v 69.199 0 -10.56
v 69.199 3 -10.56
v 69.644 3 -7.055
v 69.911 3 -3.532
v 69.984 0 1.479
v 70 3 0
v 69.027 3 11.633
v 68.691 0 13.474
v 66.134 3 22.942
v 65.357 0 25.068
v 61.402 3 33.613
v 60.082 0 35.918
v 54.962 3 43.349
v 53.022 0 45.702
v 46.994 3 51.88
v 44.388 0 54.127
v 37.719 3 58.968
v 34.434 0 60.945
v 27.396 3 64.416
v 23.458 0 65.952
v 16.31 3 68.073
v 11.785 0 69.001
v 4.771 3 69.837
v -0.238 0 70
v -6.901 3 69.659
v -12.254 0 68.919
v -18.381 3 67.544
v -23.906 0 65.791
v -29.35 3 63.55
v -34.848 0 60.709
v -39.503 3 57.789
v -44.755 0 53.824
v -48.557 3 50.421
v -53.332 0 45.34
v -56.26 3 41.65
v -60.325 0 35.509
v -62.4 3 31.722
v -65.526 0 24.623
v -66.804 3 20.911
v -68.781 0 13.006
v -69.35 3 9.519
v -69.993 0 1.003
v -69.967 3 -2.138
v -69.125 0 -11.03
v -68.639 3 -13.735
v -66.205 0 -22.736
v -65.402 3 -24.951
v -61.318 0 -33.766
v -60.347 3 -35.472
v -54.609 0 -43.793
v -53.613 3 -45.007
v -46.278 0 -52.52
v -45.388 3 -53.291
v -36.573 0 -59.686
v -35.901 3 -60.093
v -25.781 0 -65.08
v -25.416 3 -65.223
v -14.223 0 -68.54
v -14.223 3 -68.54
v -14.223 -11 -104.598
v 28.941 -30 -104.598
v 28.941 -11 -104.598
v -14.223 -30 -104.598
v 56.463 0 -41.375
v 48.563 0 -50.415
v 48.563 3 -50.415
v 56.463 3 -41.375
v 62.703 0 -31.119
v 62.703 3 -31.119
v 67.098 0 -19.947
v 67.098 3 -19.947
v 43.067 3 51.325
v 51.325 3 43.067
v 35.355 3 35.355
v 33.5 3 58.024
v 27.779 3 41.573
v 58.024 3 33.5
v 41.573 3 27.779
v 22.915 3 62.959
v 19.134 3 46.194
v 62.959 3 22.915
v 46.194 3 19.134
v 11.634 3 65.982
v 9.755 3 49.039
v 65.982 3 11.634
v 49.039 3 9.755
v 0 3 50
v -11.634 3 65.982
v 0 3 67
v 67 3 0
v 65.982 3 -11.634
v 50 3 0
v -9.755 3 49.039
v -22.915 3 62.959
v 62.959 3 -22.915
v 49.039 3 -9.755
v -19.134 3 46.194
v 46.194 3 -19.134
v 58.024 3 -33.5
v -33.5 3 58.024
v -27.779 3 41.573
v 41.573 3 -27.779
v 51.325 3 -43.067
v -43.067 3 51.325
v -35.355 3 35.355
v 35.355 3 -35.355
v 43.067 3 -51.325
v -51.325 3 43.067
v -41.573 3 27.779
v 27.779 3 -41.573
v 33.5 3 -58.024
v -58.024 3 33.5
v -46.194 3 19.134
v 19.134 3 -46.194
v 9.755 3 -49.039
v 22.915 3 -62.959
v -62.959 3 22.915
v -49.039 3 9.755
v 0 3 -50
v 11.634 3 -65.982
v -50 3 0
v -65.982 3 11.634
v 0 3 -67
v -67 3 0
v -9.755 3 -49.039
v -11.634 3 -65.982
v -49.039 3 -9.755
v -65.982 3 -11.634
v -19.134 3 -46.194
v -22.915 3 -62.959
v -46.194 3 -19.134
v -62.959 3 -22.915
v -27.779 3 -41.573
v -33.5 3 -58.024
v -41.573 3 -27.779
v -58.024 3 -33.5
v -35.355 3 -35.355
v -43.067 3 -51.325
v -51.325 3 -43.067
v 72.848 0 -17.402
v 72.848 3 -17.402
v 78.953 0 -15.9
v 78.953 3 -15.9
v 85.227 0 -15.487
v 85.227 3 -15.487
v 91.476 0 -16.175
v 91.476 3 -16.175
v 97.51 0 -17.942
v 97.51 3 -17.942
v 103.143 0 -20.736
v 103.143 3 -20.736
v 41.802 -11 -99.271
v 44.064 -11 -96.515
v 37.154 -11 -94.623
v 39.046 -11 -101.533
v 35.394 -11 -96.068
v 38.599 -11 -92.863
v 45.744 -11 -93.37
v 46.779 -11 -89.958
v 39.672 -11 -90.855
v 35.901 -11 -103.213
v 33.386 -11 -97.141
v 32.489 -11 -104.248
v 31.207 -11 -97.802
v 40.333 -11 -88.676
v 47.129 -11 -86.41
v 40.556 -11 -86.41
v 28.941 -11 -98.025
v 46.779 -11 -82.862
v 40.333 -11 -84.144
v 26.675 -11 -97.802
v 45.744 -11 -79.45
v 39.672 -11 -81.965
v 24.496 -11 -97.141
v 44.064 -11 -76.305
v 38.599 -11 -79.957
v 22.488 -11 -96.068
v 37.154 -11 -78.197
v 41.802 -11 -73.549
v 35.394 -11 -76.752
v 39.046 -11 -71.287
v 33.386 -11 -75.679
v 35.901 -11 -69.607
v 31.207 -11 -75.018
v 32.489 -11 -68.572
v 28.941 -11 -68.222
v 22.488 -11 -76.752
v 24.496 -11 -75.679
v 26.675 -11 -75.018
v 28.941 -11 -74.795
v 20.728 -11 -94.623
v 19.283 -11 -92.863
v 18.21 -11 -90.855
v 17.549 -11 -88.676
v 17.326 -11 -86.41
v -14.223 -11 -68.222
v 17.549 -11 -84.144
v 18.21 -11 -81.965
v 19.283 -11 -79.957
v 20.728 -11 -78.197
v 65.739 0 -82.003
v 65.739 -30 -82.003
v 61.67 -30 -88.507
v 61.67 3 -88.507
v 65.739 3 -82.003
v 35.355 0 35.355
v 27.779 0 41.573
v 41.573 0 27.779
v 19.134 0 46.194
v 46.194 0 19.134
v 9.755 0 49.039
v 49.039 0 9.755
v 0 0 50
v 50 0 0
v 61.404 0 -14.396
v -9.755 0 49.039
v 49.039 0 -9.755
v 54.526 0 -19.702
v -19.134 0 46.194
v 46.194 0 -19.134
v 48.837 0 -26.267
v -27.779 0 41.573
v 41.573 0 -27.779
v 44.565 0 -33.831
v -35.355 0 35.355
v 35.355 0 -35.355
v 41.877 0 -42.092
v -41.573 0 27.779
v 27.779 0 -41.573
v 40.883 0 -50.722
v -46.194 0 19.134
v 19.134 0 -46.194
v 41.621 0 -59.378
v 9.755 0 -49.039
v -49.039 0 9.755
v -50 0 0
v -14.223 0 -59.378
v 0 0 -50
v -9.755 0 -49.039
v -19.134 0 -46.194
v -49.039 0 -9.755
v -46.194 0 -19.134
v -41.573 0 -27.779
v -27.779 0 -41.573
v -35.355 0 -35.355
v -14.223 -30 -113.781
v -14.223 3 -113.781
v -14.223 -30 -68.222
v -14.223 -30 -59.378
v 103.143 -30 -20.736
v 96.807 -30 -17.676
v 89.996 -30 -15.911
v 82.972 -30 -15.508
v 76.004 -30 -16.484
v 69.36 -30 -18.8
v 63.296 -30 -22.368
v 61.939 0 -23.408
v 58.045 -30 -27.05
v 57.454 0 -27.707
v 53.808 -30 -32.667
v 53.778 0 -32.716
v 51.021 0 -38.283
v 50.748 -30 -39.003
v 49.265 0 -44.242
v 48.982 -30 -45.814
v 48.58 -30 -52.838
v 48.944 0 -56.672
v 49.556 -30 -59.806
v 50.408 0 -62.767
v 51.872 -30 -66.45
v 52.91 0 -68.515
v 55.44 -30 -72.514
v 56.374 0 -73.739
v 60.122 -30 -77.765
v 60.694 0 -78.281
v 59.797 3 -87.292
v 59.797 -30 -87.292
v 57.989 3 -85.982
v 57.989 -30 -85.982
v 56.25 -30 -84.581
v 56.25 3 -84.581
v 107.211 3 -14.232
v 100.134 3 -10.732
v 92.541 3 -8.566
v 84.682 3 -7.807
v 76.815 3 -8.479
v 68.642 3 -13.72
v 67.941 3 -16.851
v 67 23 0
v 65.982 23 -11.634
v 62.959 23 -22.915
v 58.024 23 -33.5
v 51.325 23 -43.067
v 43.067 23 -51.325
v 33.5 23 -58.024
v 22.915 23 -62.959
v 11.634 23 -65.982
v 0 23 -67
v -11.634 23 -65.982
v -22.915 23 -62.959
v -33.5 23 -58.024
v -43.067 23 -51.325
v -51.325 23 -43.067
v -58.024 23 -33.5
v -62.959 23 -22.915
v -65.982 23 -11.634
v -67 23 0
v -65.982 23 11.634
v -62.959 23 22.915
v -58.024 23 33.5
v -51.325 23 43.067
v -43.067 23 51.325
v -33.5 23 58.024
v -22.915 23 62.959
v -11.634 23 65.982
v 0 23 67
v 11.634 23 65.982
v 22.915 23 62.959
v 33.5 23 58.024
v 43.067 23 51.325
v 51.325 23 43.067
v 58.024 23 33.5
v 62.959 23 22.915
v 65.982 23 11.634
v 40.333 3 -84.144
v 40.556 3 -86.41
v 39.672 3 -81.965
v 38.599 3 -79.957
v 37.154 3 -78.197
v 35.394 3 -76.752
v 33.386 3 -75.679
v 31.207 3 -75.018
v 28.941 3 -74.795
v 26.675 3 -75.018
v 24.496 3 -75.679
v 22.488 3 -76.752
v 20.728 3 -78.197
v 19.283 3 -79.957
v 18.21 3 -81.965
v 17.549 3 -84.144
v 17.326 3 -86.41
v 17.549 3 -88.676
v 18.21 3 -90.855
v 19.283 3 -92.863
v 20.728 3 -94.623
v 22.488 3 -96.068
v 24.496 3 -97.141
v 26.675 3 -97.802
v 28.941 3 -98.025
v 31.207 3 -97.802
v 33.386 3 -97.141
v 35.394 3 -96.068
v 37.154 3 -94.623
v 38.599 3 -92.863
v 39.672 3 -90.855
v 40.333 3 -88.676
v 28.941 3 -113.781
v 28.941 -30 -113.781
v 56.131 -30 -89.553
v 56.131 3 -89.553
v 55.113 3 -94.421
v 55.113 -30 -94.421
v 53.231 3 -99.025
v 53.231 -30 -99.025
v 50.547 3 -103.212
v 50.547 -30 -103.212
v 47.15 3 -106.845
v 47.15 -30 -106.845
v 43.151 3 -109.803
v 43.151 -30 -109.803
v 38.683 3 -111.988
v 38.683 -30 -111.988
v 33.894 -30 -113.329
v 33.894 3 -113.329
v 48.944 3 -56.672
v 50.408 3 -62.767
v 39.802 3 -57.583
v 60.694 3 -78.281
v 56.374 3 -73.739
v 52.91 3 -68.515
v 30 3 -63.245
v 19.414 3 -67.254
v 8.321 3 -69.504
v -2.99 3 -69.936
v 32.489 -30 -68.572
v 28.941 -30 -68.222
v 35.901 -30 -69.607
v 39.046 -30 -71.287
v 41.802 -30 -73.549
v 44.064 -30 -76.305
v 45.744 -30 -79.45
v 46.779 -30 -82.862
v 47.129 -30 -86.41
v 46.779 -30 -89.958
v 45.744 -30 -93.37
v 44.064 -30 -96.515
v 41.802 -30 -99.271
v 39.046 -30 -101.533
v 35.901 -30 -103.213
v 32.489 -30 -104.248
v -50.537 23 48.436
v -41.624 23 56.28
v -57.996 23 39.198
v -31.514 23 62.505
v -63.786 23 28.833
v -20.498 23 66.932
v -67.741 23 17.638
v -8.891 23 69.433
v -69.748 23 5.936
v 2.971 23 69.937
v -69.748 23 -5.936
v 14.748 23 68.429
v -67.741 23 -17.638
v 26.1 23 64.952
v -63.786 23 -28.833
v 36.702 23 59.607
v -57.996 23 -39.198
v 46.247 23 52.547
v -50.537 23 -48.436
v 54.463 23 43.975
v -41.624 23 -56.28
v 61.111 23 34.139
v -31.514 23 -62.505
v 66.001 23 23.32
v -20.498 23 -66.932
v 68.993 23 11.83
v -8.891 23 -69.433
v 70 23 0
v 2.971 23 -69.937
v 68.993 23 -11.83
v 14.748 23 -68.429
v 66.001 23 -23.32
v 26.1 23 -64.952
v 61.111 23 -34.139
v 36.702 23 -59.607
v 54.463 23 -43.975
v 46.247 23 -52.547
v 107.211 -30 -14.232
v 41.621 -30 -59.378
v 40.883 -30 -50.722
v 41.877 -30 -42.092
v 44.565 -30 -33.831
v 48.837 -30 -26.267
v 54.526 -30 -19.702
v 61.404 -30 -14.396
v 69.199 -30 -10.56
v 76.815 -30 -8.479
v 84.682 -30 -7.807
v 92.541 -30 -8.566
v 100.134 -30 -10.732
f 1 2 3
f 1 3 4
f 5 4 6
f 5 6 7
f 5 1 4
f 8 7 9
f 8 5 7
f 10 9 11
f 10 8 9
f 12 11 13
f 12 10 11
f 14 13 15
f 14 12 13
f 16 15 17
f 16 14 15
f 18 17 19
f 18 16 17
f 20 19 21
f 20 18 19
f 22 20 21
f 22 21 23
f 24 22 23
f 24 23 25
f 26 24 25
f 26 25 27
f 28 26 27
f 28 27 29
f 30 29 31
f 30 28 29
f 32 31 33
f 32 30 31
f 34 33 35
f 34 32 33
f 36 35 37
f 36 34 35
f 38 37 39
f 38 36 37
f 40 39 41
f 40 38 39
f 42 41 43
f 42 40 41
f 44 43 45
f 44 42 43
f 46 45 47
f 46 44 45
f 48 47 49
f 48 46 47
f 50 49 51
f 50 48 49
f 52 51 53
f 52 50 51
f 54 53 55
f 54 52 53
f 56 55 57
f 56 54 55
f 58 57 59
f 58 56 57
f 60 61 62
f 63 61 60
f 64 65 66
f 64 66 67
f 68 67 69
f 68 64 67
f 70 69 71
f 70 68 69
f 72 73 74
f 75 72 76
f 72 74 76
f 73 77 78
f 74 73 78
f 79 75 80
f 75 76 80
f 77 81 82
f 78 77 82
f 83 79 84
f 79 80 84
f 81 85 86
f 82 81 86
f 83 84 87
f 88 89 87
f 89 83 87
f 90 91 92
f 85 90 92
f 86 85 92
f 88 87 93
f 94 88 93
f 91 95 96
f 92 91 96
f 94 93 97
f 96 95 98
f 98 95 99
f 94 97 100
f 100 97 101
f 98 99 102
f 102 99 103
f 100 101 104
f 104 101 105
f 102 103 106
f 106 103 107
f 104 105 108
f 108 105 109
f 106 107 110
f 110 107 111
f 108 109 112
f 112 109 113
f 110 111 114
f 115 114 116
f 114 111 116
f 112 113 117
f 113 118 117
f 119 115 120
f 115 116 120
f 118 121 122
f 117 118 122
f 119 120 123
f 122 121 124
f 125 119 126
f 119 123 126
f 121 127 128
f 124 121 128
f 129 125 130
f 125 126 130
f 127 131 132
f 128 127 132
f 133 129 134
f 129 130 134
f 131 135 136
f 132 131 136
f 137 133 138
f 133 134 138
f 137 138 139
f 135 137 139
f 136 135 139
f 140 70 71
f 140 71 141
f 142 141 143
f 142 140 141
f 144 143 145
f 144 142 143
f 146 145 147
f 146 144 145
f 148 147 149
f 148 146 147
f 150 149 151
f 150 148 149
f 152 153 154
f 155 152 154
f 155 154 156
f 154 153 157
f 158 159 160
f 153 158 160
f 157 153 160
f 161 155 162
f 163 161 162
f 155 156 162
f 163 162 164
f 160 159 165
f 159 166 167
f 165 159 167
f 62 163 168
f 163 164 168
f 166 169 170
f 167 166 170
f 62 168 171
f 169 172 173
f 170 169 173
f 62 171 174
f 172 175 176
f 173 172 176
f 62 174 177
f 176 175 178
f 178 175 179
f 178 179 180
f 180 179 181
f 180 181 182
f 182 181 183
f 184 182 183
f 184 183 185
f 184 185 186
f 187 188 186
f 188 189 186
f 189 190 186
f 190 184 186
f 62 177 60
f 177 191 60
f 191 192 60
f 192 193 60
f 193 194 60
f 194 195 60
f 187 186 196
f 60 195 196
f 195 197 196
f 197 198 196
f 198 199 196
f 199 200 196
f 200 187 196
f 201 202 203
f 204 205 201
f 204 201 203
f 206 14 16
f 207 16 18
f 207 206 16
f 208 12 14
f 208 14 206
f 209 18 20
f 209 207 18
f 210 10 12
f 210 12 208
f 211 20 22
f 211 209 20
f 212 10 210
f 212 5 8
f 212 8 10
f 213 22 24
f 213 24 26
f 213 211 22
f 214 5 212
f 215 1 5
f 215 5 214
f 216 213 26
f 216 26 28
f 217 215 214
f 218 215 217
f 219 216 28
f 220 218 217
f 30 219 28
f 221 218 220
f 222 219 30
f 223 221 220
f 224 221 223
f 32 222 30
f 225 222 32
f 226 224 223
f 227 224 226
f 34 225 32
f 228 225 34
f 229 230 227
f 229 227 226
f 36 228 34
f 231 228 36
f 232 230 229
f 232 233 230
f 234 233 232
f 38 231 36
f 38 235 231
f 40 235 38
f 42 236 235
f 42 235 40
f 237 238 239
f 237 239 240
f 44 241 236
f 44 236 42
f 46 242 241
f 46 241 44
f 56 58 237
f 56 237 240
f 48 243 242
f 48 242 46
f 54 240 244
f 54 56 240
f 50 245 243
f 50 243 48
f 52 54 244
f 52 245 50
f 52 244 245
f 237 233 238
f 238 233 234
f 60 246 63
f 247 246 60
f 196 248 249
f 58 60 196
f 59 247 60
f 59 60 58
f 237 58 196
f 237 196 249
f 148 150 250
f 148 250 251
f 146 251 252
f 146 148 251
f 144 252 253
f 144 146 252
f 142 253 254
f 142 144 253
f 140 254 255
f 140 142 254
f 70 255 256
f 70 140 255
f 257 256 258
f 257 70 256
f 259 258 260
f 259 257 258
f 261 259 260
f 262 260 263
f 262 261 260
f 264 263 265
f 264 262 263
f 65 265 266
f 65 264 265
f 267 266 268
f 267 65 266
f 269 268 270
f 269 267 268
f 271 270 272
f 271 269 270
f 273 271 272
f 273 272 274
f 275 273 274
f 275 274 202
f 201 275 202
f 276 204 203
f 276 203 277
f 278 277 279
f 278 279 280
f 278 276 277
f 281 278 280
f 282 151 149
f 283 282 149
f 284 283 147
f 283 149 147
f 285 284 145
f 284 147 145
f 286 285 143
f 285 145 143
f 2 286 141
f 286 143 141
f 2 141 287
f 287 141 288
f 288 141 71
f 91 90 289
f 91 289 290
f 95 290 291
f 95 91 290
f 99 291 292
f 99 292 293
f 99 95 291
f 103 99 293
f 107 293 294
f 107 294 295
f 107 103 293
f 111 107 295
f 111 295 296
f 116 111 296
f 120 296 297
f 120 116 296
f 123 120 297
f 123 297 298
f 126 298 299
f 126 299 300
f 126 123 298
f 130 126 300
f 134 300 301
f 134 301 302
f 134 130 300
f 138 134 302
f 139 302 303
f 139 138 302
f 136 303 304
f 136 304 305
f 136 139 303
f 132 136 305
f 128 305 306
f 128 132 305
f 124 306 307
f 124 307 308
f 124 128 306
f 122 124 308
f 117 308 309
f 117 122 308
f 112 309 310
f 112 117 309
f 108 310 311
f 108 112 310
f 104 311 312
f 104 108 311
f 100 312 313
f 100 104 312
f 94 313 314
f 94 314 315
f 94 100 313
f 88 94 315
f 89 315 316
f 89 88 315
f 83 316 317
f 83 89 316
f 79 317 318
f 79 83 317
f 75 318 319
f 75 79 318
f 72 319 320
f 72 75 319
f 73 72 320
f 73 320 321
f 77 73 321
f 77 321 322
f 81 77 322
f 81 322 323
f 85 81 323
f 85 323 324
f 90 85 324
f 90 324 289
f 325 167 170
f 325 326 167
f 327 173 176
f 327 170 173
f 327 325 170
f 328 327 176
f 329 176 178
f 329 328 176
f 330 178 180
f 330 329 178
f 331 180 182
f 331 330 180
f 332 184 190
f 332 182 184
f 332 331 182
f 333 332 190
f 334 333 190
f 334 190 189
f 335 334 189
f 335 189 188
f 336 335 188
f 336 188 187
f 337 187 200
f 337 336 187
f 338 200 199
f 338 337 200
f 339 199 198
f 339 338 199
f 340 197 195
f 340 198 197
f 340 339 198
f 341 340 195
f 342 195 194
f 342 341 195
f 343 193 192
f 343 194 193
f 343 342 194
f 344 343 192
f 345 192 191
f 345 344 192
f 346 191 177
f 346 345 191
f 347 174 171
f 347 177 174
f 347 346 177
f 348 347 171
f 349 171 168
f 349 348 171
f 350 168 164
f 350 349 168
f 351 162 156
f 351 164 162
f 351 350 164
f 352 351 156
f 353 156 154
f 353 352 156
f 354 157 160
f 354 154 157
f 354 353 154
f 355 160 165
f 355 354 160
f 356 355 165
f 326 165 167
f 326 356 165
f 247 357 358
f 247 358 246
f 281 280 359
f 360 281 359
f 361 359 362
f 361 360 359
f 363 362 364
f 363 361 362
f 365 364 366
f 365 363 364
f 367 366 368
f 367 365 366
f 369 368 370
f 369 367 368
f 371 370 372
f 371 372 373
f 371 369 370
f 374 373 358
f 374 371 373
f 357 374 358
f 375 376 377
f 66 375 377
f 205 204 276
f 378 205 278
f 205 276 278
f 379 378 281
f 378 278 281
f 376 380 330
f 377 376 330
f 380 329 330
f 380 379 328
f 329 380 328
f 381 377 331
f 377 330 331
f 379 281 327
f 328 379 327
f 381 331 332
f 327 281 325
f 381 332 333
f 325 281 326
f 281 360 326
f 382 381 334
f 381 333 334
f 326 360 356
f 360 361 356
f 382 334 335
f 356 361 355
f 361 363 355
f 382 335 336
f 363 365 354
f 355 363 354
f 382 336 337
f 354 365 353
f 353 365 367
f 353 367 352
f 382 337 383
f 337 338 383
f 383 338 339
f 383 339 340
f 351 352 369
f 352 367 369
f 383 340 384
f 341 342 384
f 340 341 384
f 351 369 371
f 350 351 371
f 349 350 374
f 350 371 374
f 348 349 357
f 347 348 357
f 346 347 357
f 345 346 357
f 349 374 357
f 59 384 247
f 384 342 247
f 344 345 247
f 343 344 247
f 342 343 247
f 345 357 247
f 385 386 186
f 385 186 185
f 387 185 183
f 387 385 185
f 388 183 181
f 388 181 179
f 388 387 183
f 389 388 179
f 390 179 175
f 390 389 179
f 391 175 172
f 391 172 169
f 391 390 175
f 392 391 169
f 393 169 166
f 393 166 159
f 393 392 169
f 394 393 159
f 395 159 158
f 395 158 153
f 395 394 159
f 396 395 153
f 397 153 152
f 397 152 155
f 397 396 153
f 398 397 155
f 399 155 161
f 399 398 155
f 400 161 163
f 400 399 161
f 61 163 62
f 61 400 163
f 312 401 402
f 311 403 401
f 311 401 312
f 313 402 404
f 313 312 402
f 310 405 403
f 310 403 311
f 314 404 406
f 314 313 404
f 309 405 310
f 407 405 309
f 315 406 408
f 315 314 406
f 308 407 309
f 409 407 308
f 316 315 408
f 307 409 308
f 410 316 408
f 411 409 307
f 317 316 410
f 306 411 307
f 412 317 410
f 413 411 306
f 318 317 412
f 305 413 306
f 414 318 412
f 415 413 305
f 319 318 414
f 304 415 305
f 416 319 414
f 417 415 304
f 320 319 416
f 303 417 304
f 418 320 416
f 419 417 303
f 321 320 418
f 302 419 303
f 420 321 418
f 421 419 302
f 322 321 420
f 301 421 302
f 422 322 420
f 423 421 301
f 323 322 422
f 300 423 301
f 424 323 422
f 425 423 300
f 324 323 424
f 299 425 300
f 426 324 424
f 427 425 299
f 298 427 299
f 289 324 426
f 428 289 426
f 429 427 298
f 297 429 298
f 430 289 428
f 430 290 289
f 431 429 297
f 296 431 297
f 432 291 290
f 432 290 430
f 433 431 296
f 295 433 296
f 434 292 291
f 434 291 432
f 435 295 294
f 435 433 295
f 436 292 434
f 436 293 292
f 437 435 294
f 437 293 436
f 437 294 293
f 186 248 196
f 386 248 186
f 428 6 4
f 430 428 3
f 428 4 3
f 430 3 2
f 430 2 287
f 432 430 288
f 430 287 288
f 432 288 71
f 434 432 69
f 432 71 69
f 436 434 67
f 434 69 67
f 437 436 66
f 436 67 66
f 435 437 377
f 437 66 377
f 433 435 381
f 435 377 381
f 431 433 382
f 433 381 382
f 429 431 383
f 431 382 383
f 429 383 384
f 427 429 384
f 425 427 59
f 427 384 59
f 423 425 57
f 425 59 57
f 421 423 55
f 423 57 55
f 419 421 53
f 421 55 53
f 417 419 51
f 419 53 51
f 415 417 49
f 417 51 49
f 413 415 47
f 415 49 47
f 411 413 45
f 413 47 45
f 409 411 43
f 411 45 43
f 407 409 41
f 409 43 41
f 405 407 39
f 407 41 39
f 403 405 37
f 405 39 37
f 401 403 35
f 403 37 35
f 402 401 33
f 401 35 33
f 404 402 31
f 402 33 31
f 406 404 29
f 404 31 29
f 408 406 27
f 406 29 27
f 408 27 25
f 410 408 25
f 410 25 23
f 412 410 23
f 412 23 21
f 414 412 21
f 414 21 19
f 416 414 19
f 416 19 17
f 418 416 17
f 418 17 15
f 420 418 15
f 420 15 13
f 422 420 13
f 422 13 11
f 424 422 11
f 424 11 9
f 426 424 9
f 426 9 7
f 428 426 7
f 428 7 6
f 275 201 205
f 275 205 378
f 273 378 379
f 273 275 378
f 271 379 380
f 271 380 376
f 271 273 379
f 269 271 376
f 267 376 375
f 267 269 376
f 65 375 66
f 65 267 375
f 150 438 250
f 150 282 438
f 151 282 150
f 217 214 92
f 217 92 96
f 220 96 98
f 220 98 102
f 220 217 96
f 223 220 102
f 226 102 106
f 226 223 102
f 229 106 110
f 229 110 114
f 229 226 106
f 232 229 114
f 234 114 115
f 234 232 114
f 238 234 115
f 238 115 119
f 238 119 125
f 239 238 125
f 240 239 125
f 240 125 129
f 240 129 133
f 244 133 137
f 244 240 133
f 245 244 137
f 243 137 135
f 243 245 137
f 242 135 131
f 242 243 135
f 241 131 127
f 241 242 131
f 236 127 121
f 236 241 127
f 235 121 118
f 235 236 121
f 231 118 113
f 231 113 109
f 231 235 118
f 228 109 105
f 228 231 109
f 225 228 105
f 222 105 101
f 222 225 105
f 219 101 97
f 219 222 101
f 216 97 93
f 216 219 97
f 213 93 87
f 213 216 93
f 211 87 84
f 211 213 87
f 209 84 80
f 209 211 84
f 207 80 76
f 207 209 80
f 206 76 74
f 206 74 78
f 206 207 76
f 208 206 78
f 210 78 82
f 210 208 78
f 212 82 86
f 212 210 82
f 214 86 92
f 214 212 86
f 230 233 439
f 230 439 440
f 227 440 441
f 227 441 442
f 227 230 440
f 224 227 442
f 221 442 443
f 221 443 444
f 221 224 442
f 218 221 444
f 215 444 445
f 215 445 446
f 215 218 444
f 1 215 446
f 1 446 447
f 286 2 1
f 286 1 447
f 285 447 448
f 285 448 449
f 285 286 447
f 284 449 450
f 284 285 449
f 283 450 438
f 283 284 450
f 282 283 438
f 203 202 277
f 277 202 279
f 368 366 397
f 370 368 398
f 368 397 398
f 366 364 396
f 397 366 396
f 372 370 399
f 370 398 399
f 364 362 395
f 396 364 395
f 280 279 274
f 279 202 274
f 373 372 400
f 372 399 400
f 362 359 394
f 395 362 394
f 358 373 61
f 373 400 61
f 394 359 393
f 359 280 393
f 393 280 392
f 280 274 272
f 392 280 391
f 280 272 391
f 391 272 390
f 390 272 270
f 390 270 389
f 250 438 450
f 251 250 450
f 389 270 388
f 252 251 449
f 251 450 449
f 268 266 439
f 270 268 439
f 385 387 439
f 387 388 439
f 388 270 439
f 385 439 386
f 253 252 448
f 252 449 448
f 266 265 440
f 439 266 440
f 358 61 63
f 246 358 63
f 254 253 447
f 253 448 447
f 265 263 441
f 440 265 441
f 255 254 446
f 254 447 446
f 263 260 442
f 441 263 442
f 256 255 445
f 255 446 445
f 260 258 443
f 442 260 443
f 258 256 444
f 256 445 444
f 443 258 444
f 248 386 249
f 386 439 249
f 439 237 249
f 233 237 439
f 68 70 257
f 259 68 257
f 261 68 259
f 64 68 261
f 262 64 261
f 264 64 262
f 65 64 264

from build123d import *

# Parameters (mm, degrees)
SKETCH1_R           = 50
SKETCH1_R_2         = 11.615083761
BOSS_EXTRUDE1_DEPTH = 3
SKETCH2_R           = 70
SKETCH2_R_2         = 67
BOSS_EXTRUDE3_DEPTH = 20
SKETCH4_R           = 11.615083761
BOSS_EXTRUDE6_DEPTH = 30
CUT_EXTRUDE2_DEPTH  = 19


with BuildPart() as part:
    # Sketch1 → Boss-Extrude1 (new body)
    with BuildSketch(Plane(origin=(0, 0, 0), x_dir=(1, 0, 0), z_dir=(0, 1, 0))):
        with BuildLine():
            Line((61.670303131, 88.507050428), (65.738918694, 82.002662996))
            ThreePointArc((65.738918694, 82.002662996), (52.910005118, 68.514839013), (48.562558373, 50.415056524))
            ThreePointArc((48.562558373, 50.415056524), (59.803165171, 36.381058747), (67.097930635, 19.94662138))
            ThreePointArc((67.097930635, 19.94662138), (85.226692334, 15.486926368), (103.142834496, 20.735995847))
            Line((103.142834496, 20.735995847), (107.211450059, 14.231608415))
            ThreePointArc((107.211450059, 14.231608415), (88.628926733, 8.008407228), (69.198869979, 10.560132275))
            ThreePointArc((69.198869979, 10.560132275), (-39.949778038, -57.480563973), (-14.223379462, 68.539736479))
            Line((-14.223379462, 68.539736479), (-14.223379462, 113.780543001))
            Line((-14.223379462, 113.780543001), (28.94098919, 113.780543001))
            ThreePointArc((28.94098919, 113.780543001), (48.93114235, 105.106024988), (56.25040353, 84.580872081))
            ThreePointArc((56.25040353, 84.580872081), (58.884844334, 86.648197778), (61.670303131, 88.507050428))
        make_face()
        Circle(SKETCH1_R, mode=Mode.SUBTRACT)
        with Locations((28.94098919, 86.409945266)):
            Circle(SKETCH1_R_2, mode=Mode.SUBTRACT)
    extrude(amount=BOSS_EXTRUDE1_DEPTH)

    # Sketch2 → Boss-Extrude3 (add)
    with BuildSketch(Plane(origin=(0, 3, 0), x_dir=(1, 0, 0), z_dir=(0, 1, 0))):
        Circle(SKETCH2_R)
        Circle(SKETCH2_R_2, mode=Mode.SUBTRACT)
    extrude(amount=BOSS_EXTRUDE3_DEPTH)

    # Sketch4 → Boss-Extrude6 (add)
    with BuildSketch(Plane.XZ):
        with BuildLine():
            Line((107.211450059, -14.231608415), (103.142834496, -20.735995847))
            ThreePointArc((103.142834496, -20.735995847), (53.80754302, -32.66737152), (65.738918694, -82.002662996))
            Line((65.738918694, -82.002662996), (61.670303131, -88.507050428))
            ThreePointArc((61.670303131, -88.507050428), (58.884844334, -86.648197778), (56.25040353, -84.580872081))
            ThreePointArc((56.25040353, -84.580872081), (48.93114235, -105.106024988), (28.94098919, -113.780543001))
            Line((28.94098919, -113.780543001), (-14.223379462, -113.780543001))
            Line((-14.223379462, -113.780543001), (-14.223379462, -59.37804429))
            Line((-14.223379462, -59.37804429), (41.620673144, -59.37804429))
            ThreePointArc((41.620673144, -59.37804429), (46.511966871, -29.942543741), (69.198869979, -10.560132275))
            ThreePointArc((69.198869979, -10.560132275), (88.628926733, -8.008407228), (107.211450059, -14.231608415))
        make_face()
        with Locations((28.94098919, -86.409945266)):
            Circle(SKETCH4_R, mode=Mode.SUBTRACT)
    extrude(amount=BOSS_EXTRUDE6_DEPTH)

    # Sketch6 → Cut-Extrude2 (cut)
    with BuildSketch(Plane.XZ.offset(30)):
        with BuildLine():
            Line((28.94098919, -104.597730163), (-14.223379462, -104.597730163))
            Line((-14.223379462, -104.597730163), (-14.223379462, -68.222160369))
            Line((-14.223379462, -68.222160369), (28.94098919, -68.222160369))
            ThreePointArc((28.94098919, -68.222160369), (47.128774087, -86.409945266), (28.94098919, -104.597730163))
        make_face()
    extrude(amount=-CUT_EXTRUDE2_DEPTH, mode=Mode.SUBTRACT)


solid = part.part
